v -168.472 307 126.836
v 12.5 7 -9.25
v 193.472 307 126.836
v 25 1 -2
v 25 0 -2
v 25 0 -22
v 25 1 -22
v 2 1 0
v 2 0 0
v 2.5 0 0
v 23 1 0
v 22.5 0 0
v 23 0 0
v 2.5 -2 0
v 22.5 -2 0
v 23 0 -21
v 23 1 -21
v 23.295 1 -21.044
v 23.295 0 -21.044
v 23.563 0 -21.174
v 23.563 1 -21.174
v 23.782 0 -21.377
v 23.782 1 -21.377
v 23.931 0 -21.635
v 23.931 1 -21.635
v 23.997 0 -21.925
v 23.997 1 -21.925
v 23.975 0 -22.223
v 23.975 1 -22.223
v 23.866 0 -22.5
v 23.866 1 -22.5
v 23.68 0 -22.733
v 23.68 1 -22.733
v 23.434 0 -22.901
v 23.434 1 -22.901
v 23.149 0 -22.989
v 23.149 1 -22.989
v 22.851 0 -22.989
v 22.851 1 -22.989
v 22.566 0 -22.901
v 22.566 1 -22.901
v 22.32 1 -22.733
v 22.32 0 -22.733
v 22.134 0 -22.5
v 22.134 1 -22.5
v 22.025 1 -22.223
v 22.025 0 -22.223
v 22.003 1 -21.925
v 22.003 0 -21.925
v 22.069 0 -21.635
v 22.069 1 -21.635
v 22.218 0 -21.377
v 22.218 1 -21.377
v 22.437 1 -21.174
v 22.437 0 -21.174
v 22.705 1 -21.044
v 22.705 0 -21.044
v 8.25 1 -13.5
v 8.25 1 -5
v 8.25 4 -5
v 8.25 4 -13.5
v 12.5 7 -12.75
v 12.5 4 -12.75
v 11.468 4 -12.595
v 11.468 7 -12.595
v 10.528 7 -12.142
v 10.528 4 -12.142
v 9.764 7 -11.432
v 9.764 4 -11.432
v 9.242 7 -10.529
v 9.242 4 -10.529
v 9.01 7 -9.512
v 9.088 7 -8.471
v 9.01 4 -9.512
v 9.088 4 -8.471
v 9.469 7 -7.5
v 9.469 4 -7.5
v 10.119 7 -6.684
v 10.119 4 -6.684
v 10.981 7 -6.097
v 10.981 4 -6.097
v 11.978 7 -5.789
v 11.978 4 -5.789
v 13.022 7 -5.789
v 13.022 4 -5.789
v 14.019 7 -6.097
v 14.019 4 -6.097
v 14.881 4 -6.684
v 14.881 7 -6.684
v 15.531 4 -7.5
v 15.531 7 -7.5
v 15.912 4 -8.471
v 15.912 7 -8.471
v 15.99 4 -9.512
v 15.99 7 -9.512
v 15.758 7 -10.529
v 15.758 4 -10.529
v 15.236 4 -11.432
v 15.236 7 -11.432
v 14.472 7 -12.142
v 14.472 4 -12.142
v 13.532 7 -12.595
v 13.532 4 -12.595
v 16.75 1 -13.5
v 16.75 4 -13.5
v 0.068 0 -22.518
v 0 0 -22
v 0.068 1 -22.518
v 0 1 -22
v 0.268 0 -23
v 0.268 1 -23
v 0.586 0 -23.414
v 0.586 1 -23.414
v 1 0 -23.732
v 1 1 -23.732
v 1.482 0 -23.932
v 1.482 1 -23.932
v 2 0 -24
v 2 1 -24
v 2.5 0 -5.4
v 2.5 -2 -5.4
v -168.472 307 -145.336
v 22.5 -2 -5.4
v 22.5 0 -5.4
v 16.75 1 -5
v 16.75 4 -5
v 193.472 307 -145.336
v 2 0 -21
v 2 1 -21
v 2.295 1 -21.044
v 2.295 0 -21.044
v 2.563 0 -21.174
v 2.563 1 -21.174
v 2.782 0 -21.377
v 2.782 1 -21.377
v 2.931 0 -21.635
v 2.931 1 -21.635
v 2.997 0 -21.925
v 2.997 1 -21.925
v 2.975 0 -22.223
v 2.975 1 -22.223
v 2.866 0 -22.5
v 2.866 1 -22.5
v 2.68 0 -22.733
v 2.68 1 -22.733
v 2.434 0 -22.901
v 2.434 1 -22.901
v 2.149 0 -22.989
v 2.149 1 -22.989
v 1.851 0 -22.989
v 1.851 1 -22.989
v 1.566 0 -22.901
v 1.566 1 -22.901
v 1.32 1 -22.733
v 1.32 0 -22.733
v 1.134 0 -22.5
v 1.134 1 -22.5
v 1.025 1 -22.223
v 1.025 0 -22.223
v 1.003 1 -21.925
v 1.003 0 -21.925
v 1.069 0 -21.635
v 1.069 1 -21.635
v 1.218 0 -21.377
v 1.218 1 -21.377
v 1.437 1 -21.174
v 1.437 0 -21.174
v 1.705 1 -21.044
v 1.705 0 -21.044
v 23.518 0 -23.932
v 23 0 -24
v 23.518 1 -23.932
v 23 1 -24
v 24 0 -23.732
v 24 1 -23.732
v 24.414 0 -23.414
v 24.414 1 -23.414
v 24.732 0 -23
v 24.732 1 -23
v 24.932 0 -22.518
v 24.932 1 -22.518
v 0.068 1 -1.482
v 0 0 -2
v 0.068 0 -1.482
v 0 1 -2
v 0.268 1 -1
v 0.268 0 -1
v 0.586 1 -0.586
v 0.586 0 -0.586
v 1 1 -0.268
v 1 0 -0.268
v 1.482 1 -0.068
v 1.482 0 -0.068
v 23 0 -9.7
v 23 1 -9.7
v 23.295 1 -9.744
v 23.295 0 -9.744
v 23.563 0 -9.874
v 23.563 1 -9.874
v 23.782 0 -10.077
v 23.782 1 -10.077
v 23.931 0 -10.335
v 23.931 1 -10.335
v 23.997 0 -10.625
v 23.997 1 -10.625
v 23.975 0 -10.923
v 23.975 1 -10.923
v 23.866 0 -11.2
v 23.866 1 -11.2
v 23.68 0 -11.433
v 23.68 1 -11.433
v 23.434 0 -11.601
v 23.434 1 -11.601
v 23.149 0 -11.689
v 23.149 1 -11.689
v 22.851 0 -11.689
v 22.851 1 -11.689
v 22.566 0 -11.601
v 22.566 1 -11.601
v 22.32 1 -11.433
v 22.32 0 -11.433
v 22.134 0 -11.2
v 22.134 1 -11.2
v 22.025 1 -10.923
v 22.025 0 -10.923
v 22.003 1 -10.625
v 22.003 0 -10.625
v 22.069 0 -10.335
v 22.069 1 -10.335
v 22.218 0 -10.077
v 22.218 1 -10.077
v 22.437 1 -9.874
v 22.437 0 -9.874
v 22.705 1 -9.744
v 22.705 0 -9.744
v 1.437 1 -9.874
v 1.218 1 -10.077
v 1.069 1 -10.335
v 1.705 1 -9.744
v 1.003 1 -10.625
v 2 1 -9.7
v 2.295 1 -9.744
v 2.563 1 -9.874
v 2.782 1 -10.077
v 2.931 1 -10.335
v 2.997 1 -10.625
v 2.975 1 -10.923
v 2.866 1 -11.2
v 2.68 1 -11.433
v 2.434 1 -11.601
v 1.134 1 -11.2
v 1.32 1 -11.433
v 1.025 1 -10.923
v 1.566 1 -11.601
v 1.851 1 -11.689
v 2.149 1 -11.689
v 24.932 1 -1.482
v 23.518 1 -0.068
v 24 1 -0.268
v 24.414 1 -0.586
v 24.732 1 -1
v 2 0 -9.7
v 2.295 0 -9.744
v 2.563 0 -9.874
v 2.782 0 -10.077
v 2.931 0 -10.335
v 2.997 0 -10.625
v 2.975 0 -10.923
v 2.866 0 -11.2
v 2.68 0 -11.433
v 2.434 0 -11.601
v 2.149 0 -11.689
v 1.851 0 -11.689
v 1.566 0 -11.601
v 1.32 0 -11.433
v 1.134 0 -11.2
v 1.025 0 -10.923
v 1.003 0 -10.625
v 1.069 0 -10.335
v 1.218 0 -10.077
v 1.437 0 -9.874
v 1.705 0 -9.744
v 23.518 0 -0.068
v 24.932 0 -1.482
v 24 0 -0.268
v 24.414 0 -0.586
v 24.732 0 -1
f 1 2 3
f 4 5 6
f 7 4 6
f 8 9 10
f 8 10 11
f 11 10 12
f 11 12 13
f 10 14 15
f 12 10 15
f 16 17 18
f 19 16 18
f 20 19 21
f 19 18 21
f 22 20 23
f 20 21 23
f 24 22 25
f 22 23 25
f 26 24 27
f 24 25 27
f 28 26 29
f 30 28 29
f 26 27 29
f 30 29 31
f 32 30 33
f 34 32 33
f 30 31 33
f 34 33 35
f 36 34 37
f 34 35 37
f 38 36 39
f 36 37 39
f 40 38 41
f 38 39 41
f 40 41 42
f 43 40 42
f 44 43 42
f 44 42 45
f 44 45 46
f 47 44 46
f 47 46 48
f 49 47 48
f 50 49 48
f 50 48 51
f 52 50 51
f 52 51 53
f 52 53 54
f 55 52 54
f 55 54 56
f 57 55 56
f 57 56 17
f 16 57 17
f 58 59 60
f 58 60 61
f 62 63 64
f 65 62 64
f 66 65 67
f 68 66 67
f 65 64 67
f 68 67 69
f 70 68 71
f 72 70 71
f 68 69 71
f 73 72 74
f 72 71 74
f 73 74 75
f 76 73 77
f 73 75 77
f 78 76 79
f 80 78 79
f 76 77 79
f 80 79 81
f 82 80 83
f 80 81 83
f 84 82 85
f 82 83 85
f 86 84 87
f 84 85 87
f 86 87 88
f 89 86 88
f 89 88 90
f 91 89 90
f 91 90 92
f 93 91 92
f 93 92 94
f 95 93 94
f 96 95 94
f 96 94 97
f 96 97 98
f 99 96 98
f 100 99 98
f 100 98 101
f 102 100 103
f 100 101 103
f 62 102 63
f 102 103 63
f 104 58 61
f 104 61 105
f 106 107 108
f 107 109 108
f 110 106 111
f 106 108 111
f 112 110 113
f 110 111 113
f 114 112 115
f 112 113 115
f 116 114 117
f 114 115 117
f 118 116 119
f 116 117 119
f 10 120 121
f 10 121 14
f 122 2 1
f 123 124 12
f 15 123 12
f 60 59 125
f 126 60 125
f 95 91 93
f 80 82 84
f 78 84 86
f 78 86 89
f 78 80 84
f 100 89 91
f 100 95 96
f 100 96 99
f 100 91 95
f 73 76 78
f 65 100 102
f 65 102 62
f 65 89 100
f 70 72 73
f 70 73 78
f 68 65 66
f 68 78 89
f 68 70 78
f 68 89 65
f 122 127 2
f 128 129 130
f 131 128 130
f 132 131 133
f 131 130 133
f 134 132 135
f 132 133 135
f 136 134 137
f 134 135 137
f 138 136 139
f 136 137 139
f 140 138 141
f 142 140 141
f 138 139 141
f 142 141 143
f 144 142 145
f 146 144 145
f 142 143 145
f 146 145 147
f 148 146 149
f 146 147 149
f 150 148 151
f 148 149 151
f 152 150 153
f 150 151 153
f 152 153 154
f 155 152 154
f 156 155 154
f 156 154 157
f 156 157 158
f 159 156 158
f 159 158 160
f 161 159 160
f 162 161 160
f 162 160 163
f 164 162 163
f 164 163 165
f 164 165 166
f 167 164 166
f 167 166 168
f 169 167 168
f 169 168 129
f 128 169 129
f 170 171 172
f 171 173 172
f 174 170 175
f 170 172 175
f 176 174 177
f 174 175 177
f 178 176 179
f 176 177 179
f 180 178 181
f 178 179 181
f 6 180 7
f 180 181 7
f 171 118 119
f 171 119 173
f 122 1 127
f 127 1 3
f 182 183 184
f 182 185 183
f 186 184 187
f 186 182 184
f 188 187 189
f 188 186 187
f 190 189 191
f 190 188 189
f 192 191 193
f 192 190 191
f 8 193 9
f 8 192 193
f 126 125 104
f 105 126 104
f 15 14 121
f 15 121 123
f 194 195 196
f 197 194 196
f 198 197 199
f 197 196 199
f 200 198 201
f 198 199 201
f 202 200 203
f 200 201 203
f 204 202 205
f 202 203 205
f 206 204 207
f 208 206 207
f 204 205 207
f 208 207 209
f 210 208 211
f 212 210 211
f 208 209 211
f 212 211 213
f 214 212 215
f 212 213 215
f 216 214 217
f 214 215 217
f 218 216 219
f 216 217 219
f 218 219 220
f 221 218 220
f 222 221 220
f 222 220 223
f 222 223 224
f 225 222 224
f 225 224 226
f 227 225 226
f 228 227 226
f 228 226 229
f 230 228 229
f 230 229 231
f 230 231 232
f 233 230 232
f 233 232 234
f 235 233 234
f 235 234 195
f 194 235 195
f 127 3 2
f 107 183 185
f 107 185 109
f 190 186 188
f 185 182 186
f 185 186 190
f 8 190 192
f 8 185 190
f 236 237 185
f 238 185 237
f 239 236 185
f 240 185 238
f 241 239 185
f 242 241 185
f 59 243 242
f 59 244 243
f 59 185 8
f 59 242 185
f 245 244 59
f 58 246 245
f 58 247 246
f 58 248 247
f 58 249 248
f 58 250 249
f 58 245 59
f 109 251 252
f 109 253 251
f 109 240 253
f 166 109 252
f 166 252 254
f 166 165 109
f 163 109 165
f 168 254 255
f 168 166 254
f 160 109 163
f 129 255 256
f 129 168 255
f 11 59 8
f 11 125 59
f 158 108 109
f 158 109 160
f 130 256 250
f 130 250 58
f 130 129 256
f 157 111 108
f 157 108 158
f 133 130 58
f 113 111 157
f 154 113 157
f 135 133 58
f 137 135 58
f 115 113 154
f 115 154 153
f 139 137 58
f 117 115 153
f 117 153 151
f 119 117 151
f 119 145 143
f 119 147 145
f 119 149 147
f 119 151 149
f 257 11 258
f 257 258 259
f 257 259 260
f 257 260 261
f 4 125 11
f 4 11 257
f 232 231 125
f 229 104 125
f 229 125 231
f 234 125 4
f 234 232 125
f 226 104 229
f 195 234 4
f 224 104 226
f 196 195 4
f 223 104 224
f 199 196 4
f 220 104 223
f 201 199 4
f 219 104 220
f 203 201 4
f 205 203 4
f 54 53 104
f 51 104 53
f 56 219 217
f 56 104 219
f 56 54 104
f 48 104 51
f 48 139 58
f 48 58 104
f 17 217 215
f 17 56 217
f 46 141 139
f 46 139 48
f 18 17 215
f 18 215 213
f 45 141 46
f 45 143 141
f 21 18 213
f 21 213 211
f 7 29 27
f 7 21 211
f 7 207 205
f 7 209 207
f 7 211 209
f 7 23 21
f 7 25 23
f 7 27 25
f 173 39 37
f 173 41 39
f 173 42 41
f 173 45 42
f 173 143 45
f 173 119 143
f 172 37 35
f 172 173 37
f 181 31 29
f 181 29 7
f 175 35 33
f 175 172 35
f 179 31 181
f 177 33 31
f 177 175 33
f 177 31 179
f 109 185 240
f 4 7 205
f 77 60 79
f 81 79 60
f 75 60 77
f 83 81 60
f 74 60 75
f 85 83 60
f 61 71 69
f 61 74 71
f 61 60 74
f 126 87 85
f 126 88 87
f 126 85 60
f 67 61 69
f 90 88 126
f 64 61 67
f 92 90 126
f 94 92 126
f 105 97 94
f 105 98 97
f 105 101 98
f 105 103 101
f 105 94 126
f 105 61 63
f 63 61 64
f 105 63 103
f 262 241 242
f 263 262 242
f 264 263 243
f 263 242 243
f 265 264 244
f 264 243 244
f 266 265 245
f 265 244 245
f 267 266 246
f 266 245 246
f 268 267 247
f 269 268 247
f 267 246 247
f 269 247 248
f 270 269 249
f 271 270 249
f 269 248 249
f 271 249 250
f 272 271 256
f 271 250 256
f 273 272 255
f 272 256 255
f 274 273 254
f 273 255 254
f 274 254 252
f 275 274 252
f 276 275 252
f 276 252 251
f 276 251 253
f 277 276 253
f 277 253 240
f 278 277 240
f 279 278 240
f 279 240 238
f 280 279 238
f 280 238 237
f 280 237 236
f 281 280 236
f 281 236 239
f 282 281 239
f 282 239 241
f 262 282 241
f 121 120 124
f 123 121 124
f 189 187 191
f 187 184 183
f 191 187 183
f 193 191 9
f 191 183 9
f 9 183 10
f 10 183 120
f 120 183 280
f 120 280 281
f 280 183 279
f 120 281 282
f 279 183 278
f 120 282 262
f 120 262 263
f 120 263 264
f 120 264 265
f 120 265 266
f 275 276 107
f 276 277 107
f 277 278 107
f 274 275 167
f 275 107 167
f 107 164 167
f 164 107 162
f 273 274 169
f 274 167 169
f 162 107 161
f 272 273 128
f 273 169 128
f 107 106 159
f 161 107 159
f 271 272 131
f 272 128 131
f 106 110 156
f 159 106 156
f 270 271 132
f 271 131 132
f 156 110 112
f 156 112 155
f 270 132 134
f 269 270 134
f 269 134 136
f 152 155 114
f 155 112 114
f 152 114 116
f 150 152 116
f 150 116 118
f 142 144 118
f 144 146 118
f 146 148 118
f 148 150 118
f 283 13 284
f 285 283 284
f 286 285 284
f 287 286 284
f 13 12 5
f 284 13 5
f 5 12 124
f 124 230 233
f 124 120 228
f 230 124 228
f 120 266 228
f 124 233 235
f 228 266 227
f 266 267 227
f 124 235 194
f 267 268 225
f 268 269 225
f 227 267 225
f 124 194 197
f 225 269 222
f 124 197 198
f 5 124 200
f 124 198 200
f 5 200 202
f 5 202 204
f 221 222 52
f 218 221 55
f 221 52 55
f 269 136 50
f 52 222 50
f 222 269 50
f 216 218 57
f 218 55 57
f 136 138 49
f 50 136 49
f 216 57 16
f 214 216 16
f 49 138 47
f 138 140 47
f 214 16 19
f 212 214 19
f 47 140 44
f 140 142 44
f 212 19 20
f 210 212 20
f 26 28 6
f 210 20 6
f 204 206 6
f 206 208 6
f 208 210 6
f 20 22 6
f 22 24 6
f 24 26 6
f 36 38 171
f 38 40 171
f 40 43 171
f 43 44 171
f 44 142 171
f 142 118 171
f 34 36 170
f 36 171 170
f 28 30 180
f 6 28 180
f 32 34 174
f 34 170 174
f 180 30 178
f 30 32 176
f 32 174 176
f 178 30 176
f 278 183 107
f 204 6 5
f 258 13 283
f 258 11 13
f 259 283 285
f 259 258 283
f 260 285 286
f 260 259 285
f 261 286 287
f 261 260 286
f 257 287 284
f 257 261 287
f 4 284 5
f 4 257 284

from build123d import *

# Parameters (mm, degrees)
SKETCH1_W           = 25
SKETCH1_H           = 24
BOSS_EXTRUDE1_DEPTH = 1
SKETCH2_W           = 8.5
SKETCH2_H           = 8.5
BOSS_EXTRUDE2_DEPTH = 3
SKETCH3_R           = 3.5
BOSS_EXTRUDE3_DEPTH = 3
SKETCH4_W           = 20
SKETCH4_H           = 5.4
BOSS_EXTRUDE4_DEPTH = 2
SKETCH5_R           = 1
CUT_EXTRUDE1_DEPTH  = 36.17101079
FILLET1_R           = 2
BOSS_EXTRUDE5_DEPTH = 200
BOSS_EXTRUDE6_DEPTH = 200


with BuildPart() as part:
    # Sketch1 → Boss-Extrude1 (new body)
    with BuildSketch(Plane(origin=(0, 0, 0), x_dir=(1, 0, 0), z_dir=(0, 1, 0))):
        with Locations((12.5, 12)):
            Rectangle(SKETCH1_W, SKETCH1_H)
    extrude(amount=BOSS_EXTRUDE1_DEPTH)

    # Sketch2 → Boss-Extrude2 (add)
    with BuildSketch(Plane(origin=(0, 1, 0), x_dir=(1, 0, 0), z_dir=(0, 1, 0))):
        with Locations((12.5, 9.25)):
            Rectangle(SKETCH2_W, SKETCH2_H)
    extrude(amount=BOSS_EXTRUDE2_DEPTH)

    # Sketch3 → Boss-Extrude3 (add)
    with BuildSketch(Plane(origin=(0, 4, 0), x_dir=(1, 0, 0), z_dir=(0, 1, 0))):
        with Locations(Location((12.5, 9.25, 0), (0, 0, 90))):
            Circle(SKETCH3_R)
    extrude(amount=BOSS_EXTRUDE3_DEPTH)

    # Sketch4 → Boss-Extrude4 (add)
    with BuildSketch(Plane.XZ):
        with Locations((12.5, -2.7)):
            Rectangle(SKETCH4_W, SKETCH4_H)
    extrude(amount=BOSS_EXTRUDE4_DEPTH)

    # Sketch5 → Cut-Extrude1 (cut, through all)
    with BuildSketch(Plane(origin=(0, 1, 0), x_dir=(1, 0, 0), z_dir=(0, 1, 0))):
        with Locations(Location((2, 10.7, 0), (0, 0, 270))):
            Circle(SKETCH5_R)
        with Locations(Location((2, 22, 0), (0, 0, 270))):
            Circle(SKETCH5_R)
        with Locations(Location((23, 22, 0), (0, 0, 270))):
            Circle(SKETCH5_R)
        with Locations(Location((23, 10.7, 0), (0, 0, 270))):
            Circle(SKETCH5_R)
    extrude(amount=-CUT_EXTRUDE1_DEPTH, mode=Mode.SUBTRACT)

    # Fillet1
    fillet1_edges = [part.edges().sort_by_distance(p)[0] for p in [
        (0, 0.5, -24),
        (25, 0.5, -24),
        (25, 0.5, 0),
        (0, 0.5, 0),
    ]]
    fillet(fillet1_edges, radius=FILLET1_R)


with BuildPart() as body_2:
    # Sketch6 → Boss-Extrude5 (new, symmetric)
    with BuildSketch(Plane(origin=(0, 0, 0), x_dir=(0, 0, -1), z_dir=(1, 0, 0))):
        Polygon((9.25, 7), (-126.836035449, 307), (145.336035449, 307), align=None)
    extrude(amount=BOSS_EXTRUDE5_DEPTH, both=True)


with BuildPart() as body_3:
    # Sketch8 → Boss-Extrude6 (new, symmetric)
    with BuildSketch(Plane.XY):
        Polygon((12.5, 7), (-168.471570024, 307), (193.471570024, 307), align=None)
    extrude(amount=BOSS_EXTRUDE6_DEPTH, both=True)

    # Intersect1: read off the stored shape, not the designer's step
    # Intersect1: intersect body 2
    add(body_2.part, mode=Mode.INTERSECT)


solid = Compound([part.part, body_3.part])
